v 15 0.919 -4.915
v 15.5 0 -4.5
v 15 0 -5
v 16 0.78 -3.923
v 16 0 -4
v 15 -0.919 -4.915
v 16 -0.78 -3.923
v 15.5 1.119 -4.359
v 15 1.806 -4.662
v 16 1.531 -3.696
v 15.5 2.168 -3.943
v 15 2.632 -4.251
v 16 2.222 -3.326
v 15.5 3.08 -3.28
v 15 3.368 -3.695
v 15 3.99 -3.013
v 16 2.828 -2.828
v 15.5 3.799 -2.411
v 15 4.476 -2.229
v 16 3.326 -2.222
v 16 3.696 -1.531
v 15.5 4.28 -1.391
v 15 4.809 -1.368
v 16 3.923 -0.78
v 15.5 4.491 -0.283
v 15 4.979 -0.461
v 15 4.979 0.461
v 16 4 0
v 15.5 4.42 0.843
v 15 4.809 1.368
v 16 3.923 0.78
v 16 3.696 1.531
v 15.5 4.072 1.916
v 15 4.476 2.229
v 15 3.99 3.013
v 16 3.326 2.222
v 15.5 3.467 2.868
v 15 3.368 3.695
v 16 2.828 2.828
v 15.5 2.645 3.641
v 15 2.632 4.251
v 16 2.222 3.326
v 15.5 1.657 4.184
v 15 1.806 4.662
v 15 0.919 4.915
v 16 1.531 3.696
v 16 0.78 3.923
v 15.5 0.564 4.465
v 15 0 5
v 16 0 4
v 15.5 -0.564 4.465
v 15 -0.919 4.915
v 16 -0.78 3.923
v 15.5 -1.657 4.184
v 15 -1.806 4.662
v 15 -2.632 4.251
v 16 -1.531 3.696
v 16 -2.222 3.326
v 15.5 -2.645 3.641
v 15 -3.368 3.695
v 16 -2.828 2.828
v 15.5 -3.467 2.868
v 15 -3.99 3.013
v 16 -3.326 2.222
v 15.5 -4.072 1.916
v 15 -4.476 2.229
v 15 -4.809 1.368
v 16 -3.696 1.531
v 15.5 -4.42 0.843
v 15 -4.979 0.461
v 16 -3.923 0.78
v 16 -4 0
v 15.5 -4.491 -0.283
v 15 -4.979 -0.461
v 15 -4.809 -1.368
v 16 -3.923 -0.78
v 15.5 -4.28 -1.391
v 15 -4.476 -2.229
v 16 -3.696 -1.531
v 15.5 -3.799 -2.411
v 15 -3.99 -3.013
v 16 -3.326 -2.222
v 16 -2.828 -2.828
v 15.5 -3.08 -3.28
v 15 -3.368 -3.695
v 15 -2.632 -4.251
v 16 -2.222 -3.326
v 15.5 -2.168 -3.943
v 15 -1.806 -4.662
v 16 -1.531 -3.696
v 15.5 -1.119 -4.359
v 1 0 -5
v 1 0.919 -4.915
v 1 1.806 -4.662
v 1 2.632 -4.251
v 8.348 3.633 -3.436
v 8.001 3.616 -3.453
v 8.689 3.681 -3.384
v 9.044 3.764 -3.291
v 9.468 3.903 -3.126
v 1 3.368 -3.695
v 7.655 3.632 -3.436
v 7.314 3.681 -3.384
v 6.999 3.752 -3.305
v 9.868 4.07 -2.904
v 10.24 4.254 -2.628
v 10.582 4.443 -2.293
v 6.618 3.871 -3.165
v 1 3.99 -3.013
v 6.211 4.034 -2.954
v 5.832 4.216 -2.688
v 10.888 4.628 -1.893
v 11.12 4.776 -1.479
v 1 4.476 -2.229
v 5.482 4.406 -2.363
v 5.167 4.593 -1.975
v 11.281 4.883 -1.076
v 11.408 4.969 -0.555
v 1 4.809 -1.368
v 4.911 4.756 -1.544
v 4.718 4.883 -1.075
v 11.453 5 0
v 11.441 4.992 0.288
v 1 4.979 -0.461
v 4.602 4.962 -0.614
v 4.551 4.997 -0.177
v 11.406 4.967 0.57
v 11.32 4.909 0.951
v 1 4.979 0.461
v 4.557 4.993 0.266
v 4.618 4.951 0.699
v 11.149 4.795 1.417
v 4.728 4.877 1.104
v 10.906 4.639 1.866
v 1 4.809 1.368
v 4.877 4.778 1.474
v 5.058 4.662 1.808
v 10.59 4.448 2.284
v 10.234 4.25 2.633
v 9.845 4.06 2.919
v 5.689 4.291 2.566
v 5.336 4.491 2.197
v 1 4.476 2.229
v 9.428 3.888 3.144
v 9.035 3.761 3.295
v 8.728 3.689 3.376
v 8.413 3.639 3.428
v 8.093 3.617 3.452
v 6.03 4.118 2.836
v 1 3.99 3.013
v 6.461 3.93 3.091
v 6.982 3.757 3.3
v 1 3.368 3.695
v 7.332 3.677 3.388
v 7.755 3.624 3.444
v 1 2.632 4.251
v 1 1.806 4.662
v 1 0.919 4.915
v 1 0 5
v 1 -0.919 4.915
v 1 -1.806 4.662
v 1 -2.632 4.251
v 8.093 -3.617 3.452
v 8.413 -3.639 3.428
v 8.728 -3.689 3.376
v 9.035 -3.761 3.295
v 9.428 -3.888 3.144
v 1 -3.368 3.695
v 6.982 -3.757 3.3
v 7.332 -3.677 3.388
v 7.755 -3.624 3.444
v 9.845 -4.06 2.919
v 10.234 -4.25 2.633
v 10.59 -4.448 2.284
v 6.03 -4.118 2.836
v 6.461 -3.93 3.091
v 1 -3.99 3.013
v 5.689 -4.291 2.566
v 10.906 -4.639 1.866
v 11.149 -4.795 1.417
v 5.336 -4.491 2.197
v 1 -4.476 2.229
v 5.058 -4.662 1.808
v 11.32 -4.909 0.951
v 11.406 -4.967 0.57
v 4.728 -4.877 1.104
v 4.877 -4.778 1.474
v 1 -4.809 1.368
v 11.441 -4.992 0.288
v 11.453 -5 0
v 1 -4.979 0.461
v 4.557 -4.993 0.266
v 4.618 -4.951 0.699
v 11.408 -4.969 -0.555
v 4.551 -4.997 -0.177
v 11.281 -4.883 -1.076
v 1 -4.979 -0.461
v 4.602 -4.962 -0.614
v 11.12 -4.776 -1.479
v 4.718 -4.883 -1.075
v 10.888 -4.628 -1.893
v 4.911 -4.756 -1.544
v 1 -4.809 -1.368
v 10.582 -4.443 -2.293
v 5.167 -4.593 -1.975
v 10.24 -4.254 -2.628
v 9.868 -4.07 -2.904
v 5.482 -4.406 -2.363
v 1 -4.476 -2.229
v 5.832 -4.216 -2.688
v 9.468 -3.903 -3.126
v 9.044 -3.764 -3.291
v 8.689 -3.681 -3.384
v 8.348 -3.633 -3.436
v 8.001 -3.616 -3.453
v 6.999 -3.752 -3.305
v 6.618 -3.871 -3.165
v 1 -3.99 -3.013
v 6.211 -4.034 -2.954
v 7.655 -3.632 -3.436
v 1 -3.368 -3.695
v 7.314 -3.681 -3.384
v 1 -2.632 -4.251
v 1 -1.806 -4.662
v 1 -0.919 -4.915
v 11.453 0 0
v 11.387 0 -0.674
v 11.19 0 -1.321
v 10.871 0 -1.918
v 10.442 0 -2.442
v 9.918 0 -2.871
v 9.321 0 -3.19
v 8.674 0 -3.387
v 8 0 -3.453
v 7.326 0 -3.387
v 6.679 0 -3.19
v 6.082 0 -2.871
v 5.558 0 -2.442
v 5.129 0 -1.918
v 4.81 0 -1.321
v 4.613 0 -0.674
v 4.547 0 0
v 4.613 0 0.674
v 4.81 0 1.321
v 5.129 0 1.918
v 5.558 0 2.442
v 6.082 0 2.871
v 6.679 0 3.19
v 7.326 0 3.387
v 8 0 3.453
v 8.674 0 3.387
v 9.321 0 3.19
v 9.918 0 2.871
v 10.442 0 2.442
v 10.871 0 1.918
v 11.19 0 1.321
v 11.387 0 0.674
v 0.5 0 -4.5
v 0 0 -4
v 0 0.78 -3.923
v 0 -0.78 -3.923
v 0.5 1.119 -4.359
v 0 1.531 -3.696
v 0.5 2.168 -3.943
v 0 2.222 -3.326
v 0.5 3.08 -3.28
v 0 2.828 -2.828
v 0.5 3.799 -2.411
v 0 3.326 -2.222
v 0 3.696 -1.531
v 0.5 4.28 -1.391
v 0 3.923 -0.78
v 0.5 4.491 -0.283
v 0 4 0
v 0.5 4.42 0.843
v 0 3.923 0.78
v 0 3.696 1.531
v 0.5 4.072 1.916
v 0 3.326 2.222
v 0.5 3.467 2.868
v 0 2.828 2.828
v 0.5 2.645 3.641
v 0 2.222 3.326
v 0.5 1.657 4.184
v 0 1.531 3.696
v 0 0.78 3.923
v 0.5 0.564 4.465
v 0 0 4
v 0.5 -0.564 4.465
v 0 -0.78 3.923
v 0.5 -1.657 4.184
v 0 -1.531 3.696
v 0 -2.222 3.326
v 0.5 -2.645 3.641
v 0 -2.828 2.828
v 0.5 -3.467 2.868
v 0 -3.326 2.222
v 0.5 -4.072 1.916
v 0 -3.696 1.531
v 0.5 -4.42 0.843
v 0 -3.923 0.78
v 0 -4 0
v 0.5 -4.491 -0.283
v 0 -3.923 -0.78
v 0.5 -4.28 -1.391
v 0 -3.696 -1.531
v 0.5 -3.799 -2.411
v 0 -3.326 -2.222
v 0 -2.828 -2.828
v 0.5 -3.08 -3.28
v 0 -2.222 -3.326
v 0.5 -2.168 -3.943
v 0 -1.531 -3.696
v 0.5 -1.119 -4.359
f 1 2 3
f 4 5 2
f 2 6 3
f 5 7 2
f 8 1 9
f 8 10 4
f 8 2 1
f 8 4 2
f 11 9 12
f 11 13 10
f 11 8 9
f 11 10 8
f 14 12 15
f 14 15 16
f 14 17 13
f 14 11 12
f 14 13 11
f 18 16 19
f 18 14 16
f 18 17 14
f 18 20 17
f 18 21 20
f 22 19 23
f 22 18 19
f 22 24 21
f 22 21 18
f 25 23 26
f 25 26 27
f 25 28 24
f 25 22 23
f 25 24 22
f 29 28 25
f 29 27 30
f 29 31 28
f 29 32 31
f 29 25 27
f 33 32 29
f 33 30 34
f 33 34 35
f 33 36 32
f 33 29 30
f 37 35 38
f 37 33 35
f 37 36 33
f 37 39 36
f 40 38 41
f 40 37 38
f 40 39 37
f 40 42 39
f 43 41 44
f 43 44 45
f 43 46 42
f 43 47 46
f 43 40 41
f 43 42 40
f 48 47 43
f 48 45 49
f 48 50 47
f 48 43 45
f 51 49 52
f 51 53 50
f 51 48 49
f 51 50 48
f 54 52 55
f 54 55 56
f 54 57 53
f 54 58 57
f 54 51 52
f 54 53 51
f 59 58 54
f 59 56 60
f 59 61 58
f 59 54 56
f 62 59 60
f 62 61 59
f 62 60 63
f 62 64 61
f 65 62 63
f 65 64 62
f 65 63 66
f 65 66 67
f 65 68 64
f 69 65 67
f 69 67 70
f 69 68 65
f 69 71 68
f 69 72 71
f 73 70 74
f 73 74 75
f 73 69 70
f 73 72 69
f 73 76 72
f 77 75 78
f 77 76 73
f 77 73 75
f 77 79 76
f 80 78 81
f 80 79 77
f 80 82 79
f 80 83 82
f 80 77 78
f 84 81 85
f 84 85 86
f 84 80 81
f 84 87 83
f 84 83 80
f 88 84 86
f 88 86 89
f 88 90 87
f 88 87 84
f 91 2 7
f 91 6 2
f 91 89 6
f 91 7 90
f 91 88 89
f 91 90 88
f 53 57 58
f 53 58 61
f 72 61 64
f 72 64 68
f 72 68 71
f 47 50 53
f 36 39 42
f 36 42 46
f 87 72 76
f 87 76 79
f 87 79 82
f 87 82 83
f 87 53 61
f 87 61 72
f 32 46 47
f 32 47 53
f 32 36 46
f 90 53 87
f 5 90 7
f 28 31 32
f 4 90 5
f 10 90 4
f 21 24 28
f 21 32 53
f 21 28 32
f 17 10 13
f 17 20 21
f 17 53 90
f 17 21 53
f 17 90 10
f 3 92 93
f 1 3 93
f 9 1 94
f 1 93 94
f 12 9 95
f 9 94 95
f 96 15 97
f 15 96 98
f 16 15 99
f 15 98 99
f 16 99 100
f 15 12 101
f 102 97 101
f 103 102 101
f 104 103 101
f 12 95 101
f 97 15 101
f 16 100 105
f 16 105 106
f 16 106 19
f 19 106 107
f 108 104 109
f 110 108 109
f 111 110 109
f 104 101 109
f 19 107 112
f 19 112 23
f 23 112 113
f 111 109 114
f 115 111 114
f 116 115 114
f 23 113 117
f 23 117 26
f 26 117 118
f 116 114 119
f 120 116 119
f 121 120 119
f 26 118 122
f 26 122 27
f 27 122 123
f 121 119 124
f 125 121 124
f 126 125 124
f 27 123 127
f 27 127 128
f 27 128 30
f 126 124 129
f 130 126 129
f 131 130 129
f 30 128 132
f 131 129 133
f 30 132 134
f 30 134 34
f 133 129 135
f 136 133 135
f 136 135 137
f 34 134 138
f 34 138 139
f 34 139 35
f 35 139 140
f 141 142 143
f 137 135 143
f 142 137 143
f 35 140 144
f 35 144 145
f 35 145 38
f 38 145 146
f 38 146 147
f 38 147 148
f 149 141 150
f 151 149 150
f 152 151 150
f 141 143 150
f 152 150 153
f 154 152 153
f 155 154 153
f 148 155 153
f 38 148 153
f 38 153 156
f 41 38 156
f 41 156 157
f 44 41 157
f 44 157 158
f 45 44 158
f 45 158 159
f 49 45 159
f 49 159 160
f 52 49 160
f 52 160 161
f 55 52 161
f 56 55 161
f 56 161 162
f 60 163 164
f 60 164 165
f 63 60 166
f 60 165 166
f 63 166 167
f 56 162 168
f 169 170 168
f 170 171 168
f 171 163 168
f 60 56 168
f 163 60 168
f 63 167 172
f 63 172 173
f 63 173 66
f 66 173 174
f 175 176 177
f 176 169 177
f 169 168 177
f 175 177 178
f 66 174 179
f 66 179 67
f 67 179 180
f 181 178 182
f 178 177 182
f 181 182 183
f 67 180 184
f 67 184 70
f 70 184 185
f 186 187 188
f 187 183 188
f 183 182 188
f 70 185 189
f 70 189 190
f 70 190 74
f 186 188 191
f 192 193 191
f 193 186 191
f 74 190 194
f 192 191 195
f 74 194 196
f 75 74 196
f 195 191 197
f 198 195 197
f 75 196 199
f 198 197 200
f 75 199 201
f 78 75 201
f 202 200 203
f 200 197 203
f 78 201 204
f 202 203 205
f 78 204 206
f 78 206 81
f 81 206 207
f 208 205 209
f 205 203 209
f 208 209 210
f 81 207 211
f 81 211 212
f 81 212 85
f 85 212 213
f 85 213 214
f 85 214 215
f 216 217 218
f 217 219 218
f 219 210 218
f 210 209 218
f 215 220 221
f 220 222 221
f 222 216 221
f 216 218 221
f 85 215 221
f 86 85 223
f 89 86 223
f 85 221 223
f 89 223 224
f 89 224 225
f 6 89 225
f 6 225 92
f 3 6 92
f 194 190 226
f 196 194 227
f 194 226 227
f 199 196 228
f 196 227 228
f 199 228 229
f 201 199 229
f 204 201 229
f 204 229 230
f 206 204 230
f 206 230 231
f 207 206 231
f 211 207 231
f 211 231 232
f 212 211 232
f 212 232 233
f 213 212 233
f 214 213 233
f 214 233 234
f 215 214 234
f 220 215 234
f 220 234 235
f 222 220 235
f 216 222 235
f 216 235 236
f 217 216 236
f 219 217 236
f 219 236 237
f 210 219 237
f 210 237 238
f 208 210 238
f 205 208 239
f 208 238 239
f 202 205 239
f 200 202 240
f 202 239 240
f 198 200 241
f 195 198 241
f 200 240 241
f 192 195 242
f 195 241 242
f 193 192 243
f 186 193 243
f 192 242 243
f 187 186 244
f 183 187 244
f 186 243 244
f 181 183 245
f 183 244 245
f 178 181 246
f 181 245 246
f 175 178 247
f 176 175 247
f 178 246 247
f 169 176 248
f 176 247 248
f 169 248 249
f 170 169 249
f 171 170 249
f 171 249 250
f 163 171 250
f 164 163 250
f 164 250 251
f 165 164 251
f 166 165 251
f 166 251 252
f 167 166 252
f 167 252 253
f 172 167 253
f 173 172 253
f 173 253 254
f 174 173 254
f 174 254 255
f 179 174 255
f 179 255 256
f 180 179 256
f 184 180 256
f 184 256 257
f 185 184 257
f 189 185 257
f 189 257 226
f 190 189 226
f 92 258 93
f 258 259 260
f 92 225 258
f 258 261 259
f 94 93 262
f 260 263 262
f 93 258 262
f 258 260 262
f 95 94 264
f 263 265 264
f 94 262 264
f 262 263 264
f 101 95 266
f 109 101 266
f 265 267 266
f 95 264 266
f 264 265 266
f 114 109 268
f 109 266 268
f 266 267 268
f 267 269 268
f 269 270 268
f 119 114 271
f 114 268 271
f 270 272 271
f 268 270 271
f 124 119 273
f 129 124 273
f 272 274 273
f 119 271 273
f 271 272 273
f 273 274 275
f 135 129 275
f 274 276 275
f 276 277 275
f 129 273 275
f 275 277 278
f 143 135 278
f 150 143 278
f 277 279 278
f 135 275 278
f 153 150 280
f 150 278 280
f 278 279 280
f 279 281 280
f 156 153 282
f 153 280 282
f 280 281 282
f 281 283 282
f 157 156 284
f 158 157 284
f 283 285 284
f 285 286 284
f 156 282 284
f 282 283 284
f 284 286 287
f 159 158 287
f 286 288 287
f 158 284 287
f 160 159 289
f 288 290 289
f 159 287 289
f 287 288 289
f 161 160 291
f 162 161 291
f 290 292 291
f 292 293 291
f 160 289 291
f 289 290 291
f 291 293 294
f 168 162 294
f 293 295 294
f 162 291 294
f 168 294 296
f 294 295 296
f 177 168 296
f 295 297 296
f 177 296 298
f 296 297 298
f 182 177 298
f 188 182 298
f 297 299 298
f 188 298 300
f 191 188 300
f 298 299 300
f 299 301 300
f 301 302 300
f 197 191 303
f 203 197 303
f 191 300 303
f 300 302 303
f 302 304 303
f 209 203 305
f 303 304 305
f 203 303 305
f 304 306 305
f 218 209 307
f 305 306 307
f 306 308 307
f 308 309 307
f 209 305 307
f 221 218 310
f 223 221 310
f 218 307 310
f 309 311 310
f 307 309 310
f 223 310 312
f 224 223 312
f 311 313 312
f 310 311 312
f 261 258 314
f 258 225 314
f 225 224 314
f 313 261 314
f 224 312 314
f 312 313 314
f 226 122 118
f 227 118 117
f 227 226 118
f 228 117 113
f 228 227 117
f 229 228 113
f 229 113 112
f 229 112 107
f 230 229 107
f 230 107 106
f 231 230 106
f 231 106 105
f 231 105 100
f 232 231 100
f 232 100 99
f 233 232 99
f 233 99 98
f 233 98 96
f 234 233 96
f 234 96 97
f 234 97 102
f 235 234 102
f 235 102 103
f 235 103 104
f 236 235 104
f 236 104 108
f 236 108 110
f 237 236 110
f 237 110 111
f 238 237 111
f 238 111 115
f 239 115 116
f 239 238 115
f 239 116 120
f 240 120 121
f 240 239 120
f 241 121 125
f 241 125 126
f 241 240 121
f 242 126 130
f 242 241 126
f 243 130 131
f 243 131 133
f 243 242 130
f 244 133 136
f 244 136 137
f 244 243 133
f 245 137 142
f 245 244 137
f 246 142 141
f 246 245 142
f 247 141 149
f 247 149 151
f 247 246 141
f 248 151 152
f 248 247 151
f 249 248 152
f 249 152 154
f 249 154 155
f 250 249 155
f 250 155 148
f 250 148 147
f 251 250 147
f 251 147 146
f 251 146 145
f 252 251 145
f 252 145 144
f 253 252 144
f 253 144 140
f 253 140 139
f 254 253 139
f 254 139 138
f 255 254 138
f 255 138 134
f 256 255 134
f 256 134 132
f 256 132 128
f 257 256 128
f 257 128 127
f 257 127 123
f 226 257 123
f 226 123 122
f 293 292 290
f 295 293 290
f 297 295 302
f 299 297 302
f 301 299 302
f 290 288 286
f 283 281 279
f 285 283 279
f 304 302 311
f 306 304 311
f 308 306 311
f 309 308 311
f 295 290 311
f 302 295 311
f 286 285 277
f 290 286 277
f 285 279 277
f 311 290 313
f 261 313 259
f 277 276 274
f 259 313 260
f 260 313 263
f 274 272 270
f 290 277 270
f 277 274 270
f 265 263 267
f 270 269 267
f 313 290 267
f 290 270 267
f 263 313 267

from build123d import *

# Parameters (mm, degrees)
SKETCH1_R               = 5
BOSS_EXTRUDE1_DEPTH     = 16
SKETCH2_R               = 3.453172081
CUT_EXTRUDE1_DEPTH      = 6
CUT_EXTRUDE1_DEPTH_BACK = 6
CHAMFER1_SIZE           = 1


with BuildPart() as part:
    # Sketch1 → Boss-Extrude1 (new body)
    with BuildSketch(Plane(origin=(0, 0, 0), x_dir=(0, 0, -1), z_dir=(1, 0, 0))):
        Circle(SKETCH1_R)
    extrude(amount=BOSS_EXTRUDE1_DEPTH)

    # Sketch2 → Cut-Extrude1 (cut, two sides)
    with BuildSketch(Plane(origin=(0, 0, 0), x_dir=(1, 0, 0), z_dir=(0, 1, 0))) as cut_extrude1_sk:
        with Locations((8, 0)):
            Circle(SKETCH2_R)
    extrude(amount=CUT_EXTRUDE1_DEPTH, mode=Mode.SUBTRACT)
    extrude(cut_extrude1_sk.sketch, amount=-CUT_EXTRUDE1_DEPTH_BACK, mode=Mode.SUBTRACT)

    # Chamfer1
    chamfer1_edges = [part.edges().sort_by_distance(p)[0] for p in [
        (0, 0, 5),
        (16, 0, 5),
    ]]
    chamfer(chamfer1_edges, length=CHAMFER1_SIZE)


solid = part.part
